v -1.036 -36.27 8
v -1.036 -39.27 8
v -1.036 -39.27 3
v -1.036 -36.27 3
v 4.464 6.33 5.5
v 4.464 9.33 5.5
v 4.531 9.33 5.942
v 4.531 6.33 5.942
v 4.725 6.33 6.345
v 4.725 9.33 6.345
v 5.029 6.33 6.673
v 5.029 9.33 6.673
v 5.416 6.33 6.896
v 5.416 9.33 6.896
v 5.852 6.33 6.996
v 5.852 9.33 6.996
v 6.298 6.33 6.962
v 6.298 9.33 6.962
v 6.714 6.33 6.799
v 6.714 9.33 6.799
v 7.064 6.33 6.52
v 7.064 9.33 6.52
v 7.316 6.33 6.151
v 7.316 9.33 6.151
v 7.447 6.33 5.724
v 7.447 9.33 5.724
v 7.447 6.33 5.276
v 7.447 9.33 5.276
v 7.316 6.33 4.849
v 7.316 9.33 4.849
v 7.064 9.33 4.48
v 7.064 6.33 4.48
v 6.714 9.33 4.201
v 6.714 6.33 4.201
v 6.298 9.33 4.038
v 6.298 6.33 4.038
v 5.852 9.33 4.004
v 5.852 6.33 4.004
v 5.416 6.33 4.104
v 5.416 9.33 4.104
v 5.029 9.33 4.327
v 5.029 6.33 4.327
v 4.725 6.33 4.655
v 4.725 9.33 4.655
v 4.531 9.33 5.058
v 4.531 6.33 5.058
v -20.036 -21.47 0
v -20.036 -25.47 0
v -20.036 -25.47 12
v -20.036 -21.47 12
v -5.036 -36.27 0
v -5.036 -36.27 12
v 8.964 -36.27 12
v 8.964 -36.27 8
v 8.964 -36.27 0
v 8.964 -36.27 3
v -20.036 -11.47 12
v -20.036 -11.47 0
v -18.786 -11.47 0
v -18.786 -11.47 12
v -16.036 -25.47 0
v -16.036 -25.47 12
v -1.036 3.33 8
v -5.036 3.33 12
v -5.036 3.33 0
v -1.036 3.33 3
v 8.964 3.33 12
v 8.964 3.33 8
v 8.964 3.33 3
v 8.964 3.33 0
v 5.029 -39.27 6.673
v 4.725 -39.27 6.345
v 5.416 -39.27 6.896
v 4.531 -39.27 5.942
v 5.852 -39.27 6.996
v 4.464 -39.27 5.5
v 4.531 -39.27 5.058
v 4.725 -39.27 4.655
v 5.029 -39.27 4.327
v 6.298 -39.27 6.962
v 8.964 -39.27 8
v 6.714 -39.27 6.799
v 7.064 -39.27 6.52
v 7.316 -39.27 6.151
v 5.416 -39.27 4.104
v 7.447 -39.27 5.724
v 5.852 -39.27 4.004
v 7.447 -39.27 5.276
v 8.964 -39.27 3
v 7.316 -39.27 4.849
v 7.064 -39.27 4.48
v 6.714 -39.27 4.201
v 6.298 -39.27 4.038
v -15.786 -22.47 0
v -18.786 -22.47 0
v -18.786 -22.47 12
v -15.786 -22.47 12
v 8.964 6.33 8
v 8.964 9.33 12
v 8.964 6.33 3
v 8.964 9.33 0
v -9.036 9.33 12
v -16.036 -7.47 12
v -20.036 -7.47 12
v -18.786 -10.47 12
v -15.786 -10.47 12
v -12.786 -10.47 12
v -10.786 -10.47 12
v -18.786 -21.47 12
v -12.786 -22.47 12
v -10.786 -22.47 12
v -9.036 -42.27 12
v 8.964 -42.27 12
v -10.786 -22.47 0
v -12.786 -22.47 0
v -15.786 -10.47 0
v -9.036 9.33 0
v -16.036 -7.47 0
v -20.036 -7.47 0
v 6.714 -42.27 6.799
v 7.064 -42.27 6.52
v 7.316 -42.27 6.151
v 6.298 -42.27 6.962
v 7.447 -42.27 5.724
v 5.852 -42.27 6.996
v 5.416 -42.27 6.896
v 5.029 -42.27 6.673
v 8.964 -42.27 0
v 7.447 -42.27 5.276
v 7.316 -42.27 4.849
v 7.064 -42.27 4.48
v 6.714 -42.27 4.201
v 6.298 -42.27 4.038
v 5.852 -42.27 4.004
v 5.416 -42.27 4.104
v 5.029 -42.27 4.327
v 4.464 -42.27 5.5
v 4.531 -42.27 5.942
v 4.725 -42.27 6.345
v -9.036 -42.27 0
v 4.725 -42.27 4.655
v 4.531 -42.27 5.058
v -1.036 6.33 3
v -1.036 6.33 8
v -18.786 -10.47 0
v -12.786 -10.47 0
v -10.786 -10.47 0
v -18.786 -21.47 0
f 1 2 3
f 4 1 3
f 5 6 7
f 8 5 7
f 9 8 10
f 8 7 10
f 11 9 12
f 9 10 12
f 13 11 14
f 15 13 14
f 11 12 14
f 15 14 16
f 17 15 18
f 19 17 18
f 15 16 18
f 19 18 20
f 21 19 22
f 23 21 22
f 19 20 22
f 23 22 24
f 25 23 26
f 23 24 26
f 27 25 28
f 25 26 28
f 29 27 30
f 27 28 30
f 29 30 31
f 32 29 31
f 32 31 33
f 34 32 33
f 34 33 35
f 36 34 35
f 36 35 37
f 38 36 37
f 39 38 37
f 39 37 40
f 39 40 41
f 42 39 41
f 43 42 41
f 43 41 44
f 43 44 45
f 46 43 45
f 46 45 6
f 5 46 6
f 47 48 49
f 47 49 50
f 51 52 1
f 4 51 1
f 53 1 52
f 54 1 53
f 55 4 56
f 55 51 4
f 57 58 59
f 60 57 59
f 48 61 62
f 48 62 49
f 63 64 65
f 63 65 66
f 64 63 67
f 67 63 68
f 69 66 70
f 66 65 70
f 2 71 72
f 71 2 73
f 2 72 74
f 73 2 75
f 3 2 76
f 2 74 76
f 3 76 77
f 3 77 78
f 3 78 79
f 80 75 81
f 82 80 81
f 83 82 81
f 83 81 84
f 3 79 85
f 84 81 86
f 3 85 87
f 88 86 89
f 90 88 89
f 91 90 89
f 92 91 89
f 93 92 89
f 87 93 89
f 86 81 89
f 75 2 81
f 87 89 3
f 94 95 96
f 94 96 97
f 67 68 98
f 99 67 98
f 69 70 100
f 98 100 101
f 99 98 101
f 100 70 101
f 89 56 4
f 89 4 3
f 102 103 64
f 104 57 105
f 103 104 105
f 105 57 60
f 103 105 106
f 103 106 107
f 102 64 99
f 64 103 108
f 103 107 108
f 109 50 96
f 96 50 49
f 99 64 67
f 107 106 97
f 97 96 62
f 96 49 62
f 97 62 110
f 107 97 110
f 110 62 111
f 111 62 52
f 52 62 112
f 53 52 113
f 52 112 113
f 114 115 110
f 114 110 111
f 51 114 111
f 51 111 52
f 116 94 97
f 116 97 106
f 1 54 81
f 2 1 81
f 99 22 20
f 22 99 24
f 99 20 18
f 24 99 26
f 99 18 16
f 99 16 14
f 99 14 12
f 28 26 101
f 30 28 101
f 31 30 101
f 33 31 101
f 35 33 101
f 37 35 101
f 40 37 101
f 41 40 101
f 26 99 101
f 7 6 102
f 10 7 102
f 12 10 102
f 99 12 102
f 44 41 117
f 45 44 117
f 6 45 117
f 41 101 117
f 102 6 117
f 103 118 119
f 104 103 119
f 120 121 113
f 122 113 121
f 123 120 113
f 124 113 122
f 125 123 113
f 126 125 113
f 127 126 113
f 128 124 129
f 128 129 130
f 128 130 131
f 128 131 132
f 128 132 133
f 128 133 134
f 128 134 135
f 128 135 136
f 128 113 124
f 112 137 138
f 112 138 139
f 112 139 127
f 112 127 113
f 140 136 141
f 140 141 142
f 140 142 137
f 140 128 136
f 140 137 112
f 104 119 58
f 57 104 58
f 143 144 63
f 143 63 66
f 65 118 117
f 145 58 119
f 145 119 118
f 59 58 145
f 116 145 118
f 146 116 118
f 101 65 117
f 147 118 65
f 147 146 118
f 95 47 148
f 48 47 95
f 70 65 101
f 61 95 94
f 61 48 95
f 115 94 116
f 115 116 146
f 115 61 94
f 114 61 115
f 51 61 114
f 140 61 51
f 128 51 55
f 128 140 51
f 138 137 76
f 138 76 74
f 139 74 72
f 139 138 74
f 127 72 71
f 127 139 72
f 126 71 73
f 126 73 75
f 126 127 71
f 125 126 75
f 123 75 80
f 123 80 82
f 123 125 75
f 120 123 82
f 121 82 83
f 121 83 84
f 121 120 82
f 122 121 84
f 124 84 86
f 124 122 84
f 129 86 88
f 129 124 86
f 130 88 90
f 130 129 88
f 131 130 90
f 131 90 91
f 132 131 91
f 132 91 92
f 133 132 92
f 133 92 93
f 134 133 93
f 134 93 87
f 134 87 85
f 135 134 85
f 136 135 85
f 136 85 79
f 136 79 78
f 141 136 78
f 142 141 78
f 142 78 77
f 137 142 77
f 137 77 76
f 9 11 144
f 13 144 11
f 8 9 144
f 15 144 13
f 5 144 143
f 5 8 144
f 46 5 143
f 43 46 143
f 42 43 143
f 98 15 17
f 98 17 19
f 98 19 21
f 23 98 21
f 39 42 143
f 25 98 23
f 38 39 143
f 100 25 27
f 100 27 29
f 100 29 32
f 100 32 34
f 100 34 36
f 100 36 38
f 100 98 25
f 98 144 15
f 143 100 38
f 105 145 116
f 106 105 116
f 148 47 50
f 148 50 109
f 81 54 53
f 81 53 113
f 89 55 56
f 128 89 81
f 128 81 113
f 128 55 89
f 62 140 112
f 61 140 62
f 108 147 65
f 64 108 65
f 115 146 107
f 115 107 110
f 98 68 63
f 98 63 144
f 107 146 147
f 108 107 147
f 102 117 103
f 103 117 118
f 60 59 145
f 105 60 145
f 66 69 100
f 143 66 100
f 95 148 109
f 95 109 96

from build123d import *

# Parameters (mm, degrees)
BOSS_EXTRUDE1_DEPTH = 12
SKETCH2_W           = 5
SKETCH2_H           = 3
CUT_EXTRUDE1_DEPTH  = 10
CUT_EXTRUDE2_REACH  = 36.801
SKETCH3_R           = 1.5


with BuildPart() as part:
    # Sketch1 → Boss-Extrude1 (new body)
    with BuildSketch(Plane.XY):
        Polygon((-9.035894855, 9.330266172), (-16.035894855, -7.469733828), (-20.035894855, -7.469733828), (-20.035894855, -11.469733828), (-18.785894855, -11.469733828), (-18.785894855, -10.469733828), (-15.785894855, -10.469733828), (-15.785894855, -16.469733828), (-12.785894855, -16.469733828), (-12.785894855, -10.469733828), (-10.785894855, -10.469733828), (-5.035894855, 3.330266172), (8.964105145, 3.330266172), (8.964105145, 9.330266172), align=None)
    boss_extrude1 = extrude(amount=BOSS_EXTRUDE1_DEPTH)

    # Sketch2 → Cut-Extrude1 (cut)
    with BuildSketch(Plane(origin=(8.964105145, 0, 0), x_dir=(0, 0, -1), z_dir=(1, 0, 0))):
        with Locations((-5.5, 4.830266172)):
            Rectangle(SKETCH2_W, SKETCH2_H)
    cut_extrude1 = extrude(amount=-CUT_EXTRUDE1_DEPTH, mode=Mode.SUBTRACT)

    # Sketch3 → Cut-Extrude2 (cut, up to next)
    with BuildSketch(Plane(origin=(0, 9.330266172, 0), x_dir=(1, 0, 0), z_dir=(0, 1, 0)), mode=Mode.PRIVATE) as cut_extrude2_sk1:
        with Locations(Location((5.964105145, -5.5, 0), (0, 0, 180))):
            Circle(SKETCH3_R)
    cut_extrude2_tool1 = extrude(cut_extrude2_sk1.sketch, amount=-CUT_EXTRUDE2_REACH, mode=Mode.PRIVATE) & part.part
    cut_extrude2 = cut_extrude2_tool1.solids().sort_by_distance((5.964105, 9.330266, 5.5))[0]
    add(cut_extrude2, mode=Mode.SUBTRACT)

    # Mirror1: Boss-Extrude1, Cut-Extrude1, Cut-Extrude2 across plane
    add(boss_extrude1.mirror(Plane(origin=(-15.785894855, -16.469733828, 12), x_dir=(0, 0, 1), z_dir=(0, 1, 0))))
    add(cut_extrude1.mirror(Plane(origin=(-15.785894855, -16.469733828, 12), x_dir=(0, 0, 1), z_dir=(0, 1, 0))), mode=Mode.SUBTRACT)
    add(cut_extrude2.mirror(Plane(origin=(-15.785894855, -16.469733828, 12), x_dir=(0, 0, 1), z_dir=(0, 1, 0))), mode=Mode.SUBTRACT)


solid = part.part
